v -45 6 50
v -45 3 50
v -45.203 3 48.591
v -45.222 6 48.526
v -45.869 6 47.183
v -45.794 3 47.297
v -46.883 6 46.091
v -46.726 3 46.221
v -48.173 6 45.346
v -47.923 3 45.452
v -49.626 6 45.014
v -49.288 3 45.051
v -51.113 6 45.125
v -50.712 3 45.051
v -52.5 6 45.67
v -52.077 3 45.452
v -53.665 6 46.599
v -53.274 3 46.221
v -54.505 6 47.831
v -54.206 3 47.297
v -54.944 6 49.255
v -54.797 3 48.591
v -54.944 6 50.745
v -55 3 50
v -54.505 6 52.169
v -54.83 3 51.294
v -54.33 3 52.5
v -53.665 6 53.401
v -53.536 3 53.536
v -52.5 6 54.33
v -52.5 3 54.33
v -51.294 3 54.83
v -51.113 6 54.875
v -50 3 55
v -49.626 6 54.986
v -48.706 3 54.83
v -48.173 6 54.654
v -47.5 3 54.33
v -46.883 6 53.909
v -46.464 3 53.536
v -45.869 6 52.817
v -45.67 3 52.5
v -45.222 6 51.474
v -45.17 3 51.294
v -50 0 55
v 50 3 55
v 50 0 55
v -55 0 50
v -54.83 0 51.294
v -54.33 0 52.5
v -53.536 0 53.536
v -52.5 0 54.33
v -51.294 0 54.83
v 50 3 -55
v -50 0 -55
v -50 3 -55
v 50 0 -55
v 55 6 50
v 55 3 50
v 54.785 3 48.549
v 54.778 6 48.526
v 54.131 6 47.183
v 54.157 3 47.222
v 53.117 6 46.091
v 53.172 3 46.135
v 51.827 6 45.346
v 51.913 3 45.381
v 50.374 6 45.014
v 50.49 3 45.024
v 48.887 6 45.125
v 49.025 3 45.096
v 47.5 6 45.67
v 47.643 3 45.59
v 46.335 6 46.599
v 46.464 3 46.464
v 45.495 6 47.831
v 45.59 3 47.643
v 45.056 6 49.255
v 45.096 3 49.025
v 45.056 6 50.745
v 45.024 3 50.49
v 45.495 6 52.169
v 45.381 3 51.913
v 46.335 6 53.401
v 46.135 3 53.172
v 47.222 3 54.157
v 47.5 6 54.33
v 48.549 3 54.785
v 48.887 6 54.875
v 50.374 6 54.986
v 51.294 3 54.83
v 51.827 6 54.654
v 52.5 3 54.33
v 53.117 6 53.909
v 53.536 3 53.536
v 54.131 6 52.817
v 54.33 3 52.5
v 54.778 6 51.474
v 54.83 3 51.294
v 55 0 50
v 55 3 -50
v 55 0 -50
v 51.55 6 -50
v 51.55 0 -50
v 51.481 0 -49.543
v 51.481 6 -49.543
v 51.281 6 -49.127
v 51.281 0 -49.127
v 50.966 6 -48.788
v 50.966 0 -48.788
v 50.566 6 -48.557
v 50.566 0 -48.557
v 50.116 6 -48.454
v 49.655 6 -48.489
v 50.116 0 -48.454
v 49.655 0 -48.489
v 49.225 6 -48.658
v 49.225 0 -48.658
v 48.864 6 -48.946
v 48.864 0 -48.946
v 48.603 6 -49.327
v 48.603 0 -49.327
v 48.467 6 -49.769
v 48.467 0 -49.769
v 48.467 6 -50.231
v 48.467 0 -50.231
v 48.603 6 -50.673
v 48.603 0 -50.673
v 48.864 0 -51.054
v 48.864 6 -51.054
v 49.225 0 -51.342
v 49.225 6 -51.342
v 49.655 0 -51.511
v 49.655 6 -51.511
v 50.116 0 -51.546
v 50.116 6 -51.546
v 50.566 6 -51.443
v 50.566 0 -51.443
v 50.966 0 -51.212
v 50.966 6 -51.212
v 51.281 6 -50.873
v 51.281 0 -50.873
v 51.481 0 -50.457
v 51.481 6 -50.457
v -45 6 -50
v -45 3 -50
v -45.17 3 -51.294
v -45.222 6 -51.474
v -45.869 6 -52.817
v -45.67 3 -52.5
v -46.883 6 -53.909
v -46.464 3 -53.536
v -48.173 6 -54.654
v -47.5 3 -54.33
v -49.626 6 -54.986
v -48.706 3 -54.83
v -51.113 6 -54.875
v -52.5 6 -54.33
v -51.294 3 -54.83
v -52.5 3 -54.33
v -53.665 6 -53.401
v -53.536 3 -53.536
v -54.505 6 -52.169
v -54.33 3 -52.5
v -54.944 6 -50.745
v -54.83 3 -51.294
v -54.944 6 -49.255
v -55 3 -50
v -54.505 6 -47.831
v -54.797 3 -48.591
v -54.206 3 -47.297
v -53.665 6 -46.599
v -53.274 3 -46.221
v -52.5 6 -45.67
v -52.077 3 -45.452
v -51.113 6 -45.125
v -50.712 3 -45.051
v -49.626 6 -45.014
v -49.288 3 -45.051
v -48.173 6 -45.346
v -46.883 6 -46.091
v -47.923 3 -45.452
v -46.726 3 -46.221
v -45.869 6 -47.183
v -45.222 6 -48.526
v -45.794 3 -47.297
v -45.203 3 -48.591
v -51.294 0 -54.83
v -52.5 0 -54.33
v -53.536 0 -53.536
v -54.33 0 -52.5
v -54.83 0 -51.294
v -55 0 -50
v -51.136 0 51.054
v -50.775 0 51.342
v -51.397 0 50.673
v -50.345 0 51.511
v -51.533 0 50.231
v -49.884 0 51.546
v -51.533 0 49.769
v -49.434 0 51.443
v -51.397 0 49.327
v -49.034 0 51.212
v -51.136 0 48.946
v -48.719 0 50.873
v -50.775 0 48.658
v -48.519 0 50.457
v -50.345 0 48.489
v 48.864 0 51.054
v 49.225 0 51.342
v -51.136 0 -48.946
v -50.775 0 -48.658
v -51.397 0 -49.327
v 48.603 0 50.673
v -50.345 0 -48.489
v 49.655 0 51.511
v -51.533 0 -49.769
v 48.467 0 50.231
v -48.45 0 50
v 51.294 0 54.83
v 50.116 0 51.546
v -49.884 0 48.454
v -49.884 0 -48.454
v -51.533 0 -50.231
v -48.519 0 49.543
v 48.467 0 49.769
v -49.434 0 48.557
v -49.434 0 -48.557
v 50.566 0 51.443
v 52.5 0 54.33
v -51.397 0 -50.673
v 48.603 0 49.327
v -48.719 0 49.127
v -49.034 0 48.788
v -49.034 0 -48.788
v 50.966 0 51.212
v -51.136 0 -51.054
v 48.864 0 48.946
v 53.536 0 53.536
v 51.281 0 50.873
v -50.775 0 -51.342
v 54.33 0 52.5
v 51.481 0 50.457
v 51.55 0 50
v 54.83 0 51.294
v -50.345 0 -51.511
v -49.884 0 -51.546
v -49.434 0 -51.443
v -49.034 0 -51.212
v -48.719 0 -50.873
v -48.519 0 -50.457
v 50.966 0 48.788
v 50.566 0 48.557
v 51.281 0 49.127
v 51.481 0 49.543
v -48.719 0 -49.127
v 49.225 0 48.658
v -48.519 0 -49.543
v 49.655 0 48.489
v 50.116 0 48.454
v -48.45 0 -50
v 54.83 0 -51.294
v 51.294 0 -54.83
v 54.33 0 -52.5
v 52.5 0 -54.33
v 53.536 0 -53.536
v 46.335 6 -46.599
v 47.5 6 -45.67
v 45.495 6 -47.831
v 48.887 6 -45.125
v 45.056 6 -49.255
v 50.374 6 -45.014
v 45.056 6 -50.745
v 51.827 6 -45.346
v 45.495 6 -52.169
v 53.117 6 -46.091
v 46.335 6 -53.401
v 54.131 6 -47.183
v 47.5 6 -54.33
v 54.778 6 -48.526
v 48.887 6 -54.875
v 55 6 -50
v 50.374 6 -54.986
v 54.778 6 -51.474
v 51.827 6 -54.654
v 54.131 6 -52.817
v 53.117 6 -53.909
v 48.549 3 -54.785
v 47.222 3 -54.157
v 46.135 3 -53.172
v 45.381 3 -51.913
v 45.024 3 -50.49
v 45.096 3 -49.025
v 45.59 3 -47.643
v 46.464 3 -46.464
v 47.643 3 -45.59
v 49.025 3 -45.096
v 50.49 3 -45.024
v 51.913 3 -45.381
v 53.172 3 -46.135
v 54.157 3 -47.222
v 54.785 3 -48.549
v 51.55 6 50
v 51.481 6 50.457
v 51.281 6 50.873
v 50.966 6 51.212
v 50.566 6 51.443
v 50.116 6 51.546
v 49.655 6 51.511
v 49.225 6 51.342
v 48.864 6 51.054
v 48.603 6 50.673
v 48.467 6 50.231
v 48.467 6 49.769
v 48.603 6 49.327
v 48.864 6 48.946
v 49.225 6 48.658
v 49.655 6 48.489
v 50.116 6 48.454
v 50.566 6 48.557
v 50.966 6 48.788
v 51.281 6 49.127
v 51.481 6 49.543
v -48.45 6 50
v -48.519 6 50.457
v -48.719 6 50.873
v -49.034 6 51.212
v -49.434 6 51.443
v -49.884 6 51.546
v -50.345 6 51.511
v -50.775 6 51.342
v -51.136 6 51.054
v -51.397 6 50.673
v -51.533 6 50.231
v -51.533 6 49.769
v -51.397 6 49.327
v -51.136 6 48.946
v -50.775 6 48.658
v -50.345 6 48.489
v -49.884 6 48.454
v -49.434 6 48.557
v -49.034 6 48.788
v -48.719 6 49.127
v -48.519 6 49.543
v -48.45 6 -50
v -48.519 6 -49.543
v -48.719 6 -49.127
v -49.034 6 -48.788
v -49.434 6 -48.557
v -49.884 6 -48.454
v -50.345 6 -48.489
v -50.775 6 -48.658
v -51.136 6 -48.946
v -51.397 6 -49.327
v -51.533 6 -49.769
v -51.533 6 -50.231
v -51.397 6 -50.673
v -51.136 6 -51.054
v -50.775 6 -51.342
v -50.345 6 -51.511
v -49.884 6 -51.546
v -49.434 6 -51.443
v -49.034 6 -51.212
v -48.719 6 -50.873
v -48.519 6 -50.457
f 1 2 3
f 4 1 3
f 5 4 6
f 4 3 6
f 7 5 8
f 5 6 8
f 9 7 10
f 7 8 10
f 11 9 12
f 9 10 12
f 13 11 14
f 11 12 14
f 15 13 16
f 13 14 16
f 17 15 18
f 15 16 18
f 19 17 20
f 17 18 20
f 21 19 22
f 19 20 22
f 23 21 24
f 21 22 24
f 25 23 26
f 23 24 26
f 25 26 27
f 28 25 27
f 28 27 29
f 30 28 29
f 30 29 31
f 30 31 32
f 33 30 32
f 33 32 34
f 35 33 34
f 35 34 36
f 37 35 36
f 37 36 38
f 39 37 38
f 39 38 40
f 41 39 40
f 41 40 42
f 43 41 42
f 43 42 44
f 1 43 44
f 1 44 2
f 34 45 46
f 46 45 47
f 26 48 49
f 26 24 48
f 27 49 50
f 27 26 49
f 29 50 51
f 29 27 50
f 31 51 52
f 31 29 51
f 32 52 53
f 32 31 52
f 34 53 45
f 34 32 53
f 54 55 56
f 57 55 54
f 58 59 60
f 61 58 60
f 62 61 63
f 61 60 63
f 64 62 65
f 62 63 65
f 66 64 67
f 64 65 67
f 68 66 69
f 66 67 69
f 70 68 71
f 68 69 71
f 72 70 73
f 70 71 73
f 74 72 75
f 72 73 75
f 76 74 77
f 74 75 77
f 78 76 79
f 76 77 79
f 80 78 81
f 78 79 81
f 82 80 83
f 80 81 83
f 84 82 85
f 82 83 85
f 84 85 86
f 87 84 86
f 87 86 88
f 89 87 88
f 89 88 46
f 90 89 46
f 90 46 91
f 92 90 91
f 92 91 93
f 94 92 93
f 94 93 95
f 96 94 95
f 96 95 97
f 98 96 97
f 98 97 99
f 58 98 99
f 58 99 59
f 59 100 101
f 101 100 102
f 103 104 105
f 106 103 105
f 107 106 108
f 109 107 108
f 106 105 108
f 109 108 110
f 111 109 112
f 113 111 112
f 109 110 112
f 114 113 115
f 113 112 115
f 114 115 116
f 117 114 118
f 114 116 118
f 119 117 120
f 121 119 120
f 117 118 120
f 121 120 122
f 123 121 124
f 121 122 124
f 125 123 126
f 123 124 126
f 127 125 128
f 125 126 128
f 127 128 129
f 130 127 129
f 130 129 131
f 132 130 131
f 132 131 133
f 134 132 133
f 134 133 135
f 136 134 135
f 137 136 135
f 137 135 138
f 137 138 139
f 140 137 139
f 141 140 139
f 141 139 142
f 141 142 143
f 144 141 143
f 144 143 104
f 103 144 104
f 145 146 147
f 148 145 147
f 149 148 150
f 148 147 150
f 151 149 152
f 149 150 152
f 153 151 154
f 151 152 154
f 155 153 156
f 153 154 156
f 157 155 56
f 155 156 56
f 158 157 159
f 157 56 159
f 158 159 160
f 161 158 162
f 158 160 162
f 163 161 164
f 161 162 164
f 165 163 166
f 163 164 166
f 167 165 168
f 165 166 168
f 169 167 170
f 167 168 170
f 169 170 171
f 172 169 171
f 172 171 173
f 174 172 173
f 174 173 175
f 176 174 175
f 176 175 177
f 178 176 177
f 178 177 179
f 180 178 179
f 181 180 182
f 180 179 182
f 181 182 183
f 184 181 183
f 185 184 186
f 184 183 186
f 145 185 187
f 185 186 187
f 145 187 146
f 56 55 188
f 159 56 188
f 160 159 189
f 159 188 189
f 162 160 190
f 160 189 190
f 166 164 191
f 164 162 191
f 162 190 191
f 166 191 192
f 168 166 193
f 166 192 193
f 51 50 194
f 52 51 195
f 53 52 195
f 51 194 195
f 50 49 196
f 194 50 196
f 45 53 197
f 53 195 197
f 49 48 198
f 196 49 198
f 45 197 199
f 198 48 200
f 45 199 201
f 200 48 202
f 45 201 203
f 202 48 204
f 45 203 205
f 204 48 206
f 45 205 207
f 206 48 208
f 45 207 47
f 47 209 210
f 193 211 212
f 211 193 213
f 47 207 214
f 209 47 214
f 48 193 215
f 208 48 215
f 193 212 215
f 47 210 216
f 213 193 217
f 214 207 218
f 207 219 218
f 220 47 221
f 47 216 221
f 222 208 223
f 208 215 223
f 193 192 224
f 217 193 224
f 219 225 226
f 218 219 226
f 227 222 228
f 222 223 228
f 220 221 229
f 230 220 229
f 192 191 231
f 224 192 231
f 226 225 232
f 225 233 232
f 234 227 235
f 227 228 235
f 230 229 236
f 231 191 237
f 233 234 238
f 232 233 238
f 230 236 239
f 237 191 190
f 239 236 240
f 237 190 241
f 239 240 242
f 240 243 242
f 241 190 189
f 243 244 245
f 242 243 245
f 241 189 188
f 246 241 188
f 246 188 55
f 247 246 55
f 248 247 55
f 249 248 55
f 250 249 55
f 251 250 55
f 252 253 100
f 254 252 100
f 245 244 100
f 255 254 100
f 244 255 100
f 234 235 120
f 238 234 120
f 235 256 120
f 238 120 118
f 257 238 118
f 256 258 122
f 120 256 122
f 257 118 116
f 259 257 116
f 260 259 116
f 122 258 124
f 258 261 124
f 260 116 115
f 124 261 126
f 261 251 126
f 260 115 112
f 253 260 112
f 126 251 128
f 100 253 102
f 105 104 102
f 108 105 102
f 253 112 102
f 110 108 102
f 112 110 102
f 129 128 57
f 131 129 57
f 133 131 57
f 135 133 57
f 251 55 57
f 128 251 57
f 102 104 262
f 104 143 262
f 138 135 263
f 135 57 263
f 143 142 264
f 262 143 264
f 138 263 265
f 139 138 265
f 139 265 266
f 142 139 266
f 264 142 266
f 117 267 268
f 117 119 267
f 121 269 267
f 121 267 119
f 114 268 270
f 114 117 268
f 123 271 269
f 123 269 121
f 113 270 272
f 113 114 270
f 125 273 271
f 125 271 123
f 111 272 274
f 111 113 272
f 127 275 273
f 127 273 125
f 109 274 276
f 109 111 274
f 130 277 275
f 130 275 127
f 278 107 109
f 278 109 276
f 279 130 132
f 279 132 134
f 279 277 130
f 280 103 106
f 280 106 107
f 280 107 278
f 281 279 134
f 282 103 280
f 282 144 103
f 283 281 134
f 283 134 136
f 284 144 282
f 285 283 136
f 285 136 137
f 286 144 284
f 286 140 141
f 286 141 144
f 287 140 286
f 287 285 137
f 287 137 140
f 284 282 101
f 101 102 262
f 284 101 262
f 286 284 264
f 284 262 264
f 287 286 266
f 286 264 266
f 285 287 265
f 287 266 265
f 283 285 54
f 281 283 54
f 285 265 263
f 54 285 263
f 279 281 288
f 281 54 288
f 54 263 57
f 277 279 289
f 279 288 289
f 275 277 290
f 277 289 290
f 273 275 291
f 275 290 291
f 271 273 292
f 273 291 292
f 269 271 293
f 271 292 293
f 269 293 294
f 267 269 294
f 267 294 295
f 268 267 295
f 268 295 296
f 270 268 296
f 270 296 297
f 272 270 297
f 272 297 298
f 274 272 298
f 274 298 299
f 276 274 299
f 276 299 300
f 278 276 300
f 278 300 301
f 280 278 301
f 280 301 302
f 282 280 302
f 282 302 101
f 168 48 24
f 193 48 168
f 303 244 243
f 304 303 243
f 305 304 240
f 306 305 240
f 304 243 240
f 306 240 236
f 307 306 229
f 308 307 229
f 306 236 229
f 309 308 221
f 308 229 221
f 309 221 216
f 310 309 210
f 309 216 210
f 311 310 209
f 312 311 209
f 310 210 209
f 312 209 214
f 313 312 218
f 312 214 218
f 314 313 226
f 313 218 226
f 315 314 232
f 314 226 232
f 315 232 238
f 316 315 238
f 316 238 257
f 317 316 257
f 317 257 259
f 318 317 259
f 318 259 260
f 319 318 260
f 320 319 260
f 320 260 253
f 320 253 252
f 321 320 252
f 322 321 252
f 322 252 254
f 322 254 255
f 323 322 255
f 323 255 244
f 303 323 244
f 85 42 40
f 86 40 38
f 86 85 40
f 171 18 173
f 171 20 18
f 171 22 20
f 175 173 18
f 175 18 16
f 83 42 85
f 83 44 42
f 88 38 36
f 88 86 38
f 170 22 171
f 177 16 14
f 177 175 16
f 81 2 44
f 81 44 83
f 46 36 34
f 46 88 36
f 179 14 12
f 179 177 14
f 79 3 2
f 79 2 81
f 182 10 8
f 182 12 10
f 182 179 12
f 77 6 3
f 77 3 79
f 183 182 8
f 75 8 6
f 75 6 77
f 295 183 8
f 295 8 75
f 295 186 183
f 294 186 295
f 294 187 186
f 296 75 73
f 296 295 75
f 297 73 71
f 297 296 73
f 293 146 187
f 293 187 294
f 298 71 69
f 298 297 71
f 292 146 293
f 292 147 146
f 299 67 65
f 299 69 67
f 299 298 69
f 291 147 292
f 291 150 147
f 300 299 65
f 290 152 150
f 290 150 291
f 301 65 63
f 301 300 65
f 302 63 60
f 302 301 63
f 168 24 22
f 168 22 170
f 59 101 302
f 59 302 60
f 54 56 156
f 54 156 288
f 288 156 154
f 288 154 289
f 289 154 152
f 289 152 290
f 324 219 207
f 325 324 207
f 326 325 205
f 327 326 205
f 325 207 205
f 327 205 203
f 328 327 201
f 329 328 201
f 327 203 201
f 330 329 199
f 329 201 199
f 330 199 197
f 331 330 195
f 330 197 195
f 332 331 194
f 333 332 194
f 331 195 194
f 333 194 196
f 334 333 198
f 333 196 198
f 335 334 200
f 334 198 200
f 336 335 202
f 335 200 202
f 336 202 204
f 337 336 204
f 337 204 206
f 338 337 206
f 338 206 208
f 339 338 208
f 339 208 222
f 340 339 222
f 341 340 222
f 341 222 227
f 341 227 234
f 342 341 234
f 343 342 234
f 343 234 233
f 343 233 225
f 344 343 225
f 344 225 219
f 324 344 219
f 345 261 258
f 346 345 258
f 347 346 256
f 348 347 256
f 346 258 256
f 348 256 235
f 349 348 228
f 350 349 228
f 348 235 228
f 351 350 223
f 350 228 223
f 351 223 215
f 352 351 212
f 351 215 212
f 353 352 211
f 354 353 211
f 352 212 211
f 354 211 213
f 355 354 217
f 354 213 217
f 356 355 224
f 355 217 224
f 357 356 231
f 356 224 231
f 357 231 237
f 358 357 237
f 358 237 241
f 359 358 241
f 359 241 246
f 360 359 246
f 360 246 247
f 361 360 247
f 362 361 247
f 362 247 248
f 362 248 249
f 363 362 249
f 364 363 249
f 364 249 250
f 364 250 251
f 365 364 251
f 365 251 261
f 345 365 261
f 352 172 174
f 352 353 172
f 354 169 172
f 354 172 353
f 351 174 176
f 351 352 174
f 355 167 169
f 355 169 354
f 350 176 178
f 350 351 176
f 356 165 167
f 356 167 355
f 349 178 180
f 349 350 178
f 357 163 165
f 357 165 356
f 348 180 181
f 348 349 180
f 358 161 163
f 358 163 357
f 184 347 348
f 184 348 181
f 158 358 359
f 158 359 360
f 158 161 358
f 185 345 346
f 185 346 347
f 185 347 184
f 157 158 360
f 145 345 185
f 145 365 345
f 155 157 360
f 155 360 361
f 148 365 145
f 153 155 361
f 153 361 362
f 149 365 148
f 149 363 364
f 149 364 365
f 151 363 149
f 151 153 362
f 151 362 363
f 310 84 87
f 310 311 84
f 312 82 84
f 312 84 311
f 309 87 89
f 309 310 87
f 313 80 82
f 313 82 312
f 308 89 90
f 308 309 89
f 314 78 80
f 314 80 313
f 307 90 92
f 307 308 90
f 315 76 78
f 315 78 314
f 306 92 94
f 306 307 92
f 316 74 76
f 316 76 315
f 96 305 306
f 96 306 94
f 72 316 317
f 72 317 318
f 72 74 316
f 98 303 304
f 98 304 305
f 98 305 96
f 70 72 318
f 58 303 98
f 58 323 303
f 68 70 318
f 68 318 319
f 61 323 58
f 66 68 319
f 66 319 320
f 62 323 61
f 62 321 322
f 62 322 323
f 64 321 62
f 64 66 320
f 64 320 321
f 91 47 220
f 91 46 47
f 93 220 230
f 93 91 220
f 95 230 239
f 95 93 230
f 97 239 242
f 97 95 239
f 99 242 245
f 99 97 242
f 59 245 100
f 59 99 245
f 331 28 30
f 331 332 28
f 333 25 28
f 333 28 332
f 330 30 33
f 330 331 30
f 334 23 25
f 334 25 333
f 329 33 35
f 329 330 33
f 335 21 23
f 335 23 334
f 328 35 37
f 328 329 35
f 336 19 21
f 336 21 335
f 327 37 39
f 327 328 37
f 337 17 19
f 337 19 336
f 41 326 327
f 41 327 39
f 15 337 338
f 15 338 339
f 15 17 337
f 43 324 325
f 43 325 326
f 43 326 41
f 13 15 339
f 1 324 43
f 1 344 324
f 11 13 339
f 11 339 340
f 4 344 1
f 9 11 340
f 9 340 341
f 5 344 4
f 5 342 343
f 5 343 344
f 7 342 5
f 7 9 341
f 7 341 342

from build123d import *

# Parameters (mm, degrees)
SKETCH1_W           = 110
SKETCH1_H           = 110
BOSS_EXTRUDE1_DEPTH = 3
FILLET1_R           = 5
SKETCH2_R           = 5
BOSS_EXTRUDE2_DEPTH = 3
SKETCH6_R           = 1.55
CUT_EXTRUDE1_DEPTH  = 7


with BuildPart() as part:
    # Sketch1 → Boss-Extrude1 (new body)
    with BuildSketch(Plane(origin=(0, 0, 0), x_dir=(1, 0, 0), z_dir=(0, 1, 0))):
        Rectangle(SKETCH1_W, SKETCH1_H)
    extrude(amount=BOSS_EXTRUDE1_DEPTH)

    # Fillet1
    fillet1_edges = [part.edges().sort_by_distance(p)[0] for p in [
        (-55, 1.5, -55),
        (55, 1.5, -55),
        (55, 1.5, 55),
        (-55, 1.5, 55),
    ]]
    fillet(fillet1_edges, radius=FILLET1_R)

    # Sketch2 → Boss-Extrude2 (add)
    with BuildSketch(Plane(origin=(0, 3, 0), x_dir=(1, 0, 0), z_dir=(0, 1, 0))):
        with Locations((-50, 50)):
            Circle(SKETCH2_R)
        with Locations((50, 50)):
            Circle(SKETCH2_R)
        with Locations((50, -50)):
            Circle(SKETCH2_R)
        with Locations((-50, -50)):
            Circle(SKETCH2_R)
    extrude(amount=BOSS_EXTRUDE2_DEPTH)

    # Sketch6 → Cut-Extrude1 (cut, through all)
    with BuildSketch(Plane.XZ):
        with Locations((-50, 50)):
            Circle(SKETCH6_R)
        with Locations((50, -50)):
            Circle(SKETCH6_R)
        with Locations((50, 50)):
            Circle(SKETCH6_R)
        with Locations((-50, -50)):
            Circle(SKETCH6_R)
    extrude(amount=-CUT_EXTRUDE1_DEPTH, mode=Mode.SUBTRACT)


solid = part.part
